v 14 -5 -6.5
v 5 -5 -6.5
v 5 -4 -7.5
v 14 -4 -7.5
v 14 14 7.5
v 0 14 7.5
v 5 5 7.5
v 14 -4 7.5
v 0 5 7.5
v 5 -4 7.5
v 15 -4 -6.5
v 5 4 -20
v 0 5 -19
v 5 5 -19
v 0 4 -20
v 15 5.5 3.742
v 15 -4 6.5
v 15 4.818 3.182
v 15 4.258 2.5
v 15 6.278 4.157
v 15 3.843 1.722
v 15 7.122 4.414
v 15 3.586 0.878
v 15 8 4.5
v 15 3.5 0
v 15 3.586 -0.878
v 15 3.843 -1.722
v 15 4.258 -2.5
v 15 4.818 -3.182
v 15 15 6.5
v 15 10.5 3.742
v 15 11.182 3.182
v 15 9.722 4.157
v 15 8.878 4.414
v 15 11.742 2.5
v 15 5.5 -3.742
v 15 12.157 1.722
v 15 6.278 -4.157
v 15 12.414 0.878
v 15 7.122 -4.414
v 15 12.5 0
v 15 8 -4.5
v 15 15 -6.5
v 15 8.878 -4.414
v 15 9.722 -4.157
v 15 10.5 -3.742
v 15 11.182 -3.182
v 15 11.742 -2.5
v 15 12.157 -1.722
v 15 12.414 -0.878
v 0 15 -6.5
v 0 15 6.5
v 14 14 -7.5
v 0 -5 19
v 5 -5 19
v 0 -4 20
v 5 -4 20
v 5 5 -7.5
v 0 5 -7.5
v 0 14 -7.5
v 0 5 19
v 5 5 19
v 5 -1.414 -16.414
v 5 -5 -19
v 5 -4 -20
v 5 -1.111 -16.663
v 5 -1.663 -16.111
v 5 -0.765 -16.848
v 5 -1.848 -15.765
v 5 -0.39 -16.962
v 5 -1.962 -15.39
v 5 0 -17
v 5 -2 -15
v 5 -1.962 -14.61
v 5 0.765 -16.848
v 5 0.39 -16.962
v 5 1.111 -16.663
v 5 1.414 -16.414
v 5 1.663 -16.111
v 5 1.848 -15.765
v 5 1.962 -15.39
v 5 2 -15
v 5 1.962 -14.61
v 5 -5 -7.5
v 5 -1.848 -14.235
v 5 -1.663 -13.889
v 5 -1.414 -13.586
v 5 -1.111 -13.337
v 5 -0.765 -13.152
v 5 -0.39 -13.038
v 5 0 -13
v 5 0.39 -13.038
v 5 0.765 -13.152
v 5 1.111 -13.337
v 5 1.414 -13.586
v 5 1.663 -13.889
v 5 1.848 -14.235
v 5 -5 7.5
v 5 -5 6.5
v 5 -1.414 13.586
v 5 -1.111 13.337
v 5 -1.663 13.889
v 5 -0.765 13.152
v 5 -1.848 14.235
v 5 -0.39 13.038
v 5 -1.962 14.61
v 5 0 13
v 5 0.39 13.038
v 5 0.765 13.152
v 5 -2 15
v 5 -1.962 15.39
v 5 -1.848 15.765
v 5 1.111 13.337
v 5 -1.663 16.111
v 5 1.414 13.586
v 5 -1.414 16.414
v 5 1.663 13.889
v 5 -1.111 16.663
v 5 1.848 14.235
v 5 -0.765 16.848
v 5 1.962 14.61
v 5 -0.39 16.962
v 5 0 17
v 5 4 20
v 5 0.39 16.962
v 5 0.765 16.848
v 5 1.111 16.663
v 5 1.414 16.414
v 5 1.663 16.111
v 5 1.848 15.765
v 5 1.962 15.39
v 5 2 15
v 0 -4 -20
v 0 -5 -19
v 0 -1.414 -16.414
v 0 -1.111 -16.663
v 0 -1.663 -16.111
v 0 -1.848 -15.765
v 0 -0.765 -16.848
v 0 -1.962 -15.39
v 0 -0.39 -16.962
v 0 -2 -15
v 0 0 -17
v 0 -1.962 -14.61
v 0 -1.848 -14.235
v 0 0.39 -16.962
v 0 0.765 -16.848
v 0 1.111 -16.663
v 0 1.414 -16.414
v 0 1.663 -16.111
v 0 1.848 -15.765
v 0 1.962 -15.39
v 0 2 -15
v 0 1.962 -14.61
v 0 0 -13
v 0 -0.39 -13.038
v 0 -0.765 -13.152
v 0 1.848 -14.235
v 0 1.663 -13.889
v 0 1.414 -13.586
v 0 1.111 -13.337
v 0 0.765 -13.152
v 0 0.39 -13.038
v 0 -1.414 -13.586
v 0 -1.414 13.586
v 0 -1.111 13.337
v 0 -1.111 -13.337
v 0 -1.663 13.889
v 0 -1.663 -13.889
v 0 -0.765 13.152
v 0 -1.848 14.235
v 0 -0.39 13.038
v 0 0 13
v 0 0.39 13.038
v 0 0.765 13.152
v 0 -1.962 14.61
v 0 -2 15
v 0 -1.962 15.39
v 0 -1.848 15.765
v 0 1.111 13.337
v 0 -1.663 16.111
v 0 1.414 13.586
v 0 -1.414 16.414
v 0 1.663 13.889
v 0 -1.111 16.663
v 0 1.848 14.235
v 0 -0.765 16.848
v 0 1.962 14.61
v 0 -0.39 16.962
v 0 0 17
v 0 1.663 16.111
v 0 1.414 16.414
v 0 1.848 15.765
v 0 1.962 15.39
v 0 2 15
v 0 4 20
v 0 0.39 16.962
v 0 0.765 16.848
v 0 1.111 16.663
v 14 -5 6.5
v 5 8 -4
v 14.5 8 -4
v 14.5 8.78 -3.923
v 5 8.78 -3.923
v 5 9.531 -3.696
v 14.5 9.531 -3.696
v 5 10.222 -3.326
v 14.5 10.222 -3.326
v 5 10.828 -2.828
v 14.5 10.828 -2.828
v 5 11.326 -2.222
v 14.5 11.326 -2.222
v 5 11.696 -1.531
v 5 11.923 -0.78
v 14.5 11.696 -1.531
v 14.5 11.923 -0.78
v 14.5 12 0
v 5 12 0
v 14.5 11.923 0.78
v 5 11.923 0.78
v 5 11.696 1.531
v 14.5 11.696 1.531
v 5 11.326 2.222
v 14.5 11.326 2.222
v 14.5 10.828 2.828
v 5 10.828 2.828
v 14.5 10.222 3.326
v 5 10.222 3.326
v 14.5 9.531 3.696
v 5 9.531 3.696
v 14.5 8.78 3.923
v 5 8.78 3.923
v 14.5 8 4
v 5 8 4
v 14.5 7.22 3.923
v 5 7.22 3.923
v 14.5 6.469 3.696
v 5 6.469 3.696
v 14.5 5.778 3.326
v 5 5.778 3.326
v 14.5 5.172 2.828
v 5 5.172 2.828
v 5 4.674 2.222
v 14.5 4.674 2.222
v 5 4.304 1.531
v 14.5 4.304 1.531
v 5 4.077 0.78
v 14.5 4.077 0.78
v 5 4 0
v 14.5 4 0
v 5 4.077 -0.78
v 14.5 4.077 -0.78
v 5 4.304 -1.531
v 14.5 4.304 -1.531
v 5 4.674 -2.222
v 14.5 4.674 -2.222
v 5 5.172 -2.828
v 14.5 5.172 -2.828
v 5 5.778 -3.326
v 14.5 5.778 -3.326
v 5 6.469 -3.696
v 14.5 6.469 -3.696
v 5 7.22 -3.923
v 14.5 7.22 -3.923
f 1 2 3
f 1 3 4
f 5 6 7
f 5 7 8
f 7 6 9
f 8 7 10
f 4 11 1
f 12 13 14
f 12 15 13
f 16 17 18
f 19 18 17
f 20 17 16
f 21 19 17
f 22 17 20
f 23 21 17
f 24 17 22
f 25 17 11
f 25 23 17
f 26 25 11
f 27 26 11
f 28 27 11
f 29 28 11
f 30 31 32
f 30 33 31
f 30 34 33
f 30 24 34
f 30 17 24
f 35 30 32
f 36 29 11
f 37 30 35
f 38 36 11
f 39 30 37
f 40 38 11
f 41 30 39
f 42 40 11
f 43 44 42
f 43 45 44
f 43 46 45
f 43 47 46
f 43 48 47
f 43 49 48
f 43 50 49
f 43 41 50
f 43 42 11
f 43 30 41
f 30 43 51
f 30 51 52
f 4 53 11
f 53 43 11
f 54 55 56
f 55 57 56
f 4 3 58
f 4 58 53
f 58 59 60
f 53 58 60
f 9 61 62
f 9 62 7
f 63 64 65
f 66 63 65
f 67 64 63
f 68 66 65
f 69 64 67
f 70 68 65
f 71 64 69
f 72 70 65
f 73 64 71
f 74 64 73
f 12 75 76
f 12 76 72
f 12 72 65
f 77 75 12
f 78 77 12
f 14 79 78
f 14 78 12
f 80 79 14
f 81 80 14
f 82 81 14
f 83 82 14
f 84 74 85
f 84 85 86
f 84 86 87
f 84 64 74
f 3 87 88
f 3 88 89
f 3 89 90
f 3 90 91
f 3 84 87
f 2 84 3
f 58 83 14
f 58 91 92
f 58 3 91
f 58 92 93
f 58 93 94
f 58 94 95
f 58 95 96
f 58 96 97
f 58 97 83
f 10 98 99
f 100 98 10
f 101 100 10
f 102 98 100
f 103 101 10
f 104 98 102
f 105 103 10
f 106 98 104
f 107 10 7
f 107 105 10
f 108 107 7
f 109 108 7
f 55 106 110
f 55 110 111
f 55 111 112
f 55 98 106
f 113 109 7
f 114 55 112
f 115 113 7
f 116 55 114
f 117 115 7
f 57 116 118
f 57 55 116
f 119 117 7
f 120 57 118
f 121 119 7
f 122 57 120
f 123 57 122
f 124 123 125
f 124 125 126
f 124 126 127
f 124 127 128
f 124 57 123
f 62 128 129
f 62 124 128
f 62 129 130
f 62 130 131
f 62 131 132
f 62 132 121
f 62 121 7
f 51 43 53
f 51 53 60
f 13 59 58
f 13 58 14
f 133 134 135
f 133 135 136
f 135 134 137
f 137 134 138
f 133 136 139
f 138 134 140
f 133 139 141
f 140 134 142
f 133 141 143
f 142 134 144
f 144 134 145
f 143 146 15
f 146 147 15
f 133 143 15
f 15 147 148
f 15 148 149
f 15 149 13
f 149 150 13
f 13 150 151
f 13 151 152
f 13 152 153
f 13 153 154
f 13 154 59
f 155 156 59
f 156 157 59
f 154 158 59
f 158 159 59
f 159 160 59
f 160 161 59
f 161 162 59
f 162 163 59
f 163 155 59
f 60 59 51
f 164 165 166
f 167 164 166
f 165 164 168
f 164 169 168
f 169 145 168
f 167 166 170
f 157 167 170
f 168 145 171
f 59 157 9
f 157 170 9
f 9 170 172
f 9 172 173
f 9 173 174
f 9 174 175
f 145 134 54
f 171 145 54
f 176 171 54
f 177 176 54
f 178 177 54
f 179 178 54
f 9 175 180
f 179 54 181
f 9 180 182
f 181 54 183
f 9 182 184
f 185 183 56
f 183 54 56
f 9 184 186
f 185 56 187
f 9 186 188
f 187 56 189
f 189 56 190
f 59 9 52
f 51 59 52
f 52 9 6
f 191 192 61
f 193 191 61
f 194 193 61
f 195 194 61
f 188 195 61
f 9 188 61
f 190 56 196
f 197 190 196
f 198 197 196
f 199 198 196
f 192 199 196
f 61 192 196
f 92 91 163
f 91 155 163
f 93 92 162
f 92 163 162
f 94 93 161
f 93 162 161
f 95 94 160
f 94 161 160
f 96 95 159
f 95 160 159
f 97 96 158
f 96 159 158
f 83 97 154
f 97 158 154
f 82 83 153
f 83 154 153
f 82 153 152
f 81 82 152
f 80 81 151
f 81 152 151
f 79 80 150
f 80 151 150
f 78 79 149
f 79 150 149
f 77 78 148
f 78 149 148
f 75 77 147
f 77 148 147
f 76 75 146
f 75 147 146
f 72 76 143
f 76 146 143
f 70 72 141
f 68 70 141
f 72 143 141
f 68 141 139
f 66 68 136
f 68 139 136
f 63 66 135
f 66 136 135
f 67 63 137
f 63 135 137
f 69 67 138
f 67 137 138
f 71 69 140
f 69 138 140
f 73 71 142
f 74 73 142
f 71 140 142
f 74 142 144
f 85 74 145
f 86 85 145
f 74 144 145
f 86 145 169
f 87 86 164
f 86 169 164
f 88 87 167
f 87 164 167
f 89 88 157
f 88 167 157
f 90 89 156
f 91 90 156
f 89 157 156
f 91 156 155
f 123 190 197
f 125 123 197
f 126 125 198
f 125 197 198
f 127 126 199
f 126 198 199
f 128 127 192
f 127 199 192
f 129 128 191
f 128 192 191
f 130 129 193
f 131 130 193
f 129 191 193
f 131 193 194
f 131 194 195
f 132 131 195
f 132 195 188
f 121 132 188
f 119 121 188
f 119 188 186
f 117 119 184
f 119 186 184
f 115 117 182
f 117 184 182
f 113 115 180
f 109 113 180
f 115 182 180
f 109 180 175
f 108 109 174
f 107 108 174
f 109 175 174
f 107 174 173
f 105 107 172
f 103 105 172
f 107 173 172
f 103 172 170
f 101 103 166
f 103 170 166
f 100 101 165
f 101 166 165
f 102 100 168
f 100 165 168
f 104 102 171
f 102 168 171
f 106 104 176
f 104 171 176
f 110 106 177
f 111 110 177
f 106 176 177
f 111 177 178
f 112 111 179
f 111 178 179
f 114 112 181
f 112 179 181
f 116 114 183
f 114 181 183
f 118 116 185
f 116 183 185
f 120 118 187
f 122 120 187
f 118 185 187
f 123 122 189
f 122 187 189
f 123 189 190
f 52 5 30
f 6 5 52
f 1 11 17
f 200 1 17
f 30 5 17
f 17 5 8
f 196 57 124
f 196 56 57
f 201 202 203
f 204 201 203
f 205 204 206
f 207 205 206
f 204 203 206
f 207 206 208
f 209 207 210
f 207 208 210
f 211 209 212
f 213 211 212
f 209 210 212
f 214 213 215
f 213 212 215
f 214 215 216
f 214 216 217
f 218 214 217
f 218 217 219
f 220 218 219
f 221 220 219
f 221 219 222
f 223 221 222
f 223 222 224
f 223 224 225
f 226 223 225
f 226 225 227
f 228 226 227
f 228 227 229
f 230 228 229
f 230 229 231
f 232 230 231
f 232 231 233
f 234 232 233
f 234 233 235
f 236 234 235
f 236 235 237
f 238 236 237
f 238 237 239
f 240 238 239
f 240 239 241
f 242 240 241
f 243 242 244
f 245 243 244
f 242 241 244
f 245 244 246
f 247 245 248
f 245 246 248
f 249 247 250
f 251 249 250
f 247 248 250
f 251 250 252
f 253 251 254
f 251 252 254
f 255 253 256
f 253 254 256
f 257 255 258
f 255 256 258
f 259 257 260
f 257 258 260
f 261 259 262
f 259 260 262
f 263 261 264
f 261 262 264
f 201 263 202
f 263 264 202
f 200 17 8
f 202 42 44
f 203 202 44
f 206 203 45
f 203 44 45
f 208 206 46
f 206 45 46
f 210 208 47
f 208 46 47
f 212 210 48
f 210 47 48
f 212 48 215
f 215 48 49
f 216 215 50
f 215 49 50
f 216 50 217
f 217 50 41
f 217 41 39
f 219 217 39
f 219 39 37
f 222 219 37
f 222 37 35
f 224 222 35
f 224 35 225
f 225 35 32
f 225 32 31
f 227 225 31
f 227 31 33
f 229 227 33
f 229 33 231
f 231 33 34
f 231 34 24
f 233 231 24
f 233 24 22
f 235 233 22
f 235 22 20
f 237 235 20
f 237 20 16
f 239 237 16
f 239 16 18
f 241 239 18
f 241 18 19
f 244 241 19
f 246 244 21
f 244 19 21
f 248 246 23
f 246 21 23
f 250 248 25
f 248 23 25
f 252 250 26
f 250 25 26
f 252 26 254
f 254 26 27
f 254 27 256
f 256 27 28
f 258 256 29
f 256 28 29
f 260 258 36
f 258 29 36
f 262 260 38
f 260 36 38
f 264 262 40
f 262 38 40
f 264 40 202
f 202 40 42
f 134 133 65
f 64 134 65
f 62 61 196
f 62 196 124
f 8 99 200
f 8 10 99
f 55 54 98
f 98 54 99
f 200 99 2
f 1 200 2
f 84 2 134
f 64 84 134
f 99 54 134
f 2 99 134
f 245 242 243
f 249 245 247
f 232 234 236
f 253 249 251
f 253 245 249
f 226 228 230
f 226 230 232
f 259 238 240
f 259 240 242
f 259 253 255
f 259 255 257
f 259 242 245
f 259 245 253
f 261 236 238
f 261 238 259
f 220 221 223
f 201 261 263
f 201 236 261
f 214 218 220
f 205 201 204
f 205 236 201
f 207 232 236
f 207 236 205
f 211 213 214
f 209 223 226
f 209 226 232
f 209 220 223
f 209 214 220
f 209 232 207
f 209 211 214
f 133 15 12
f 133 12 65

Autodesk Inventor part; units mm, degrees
ref_plane "YZ Plane" through (0, 0, 0) normal (1, 0, 0) x (0, 1, 0)
ref_plane "XZ Plane" through (0, 0, 0) normal (0, 1, 0) x (-1, 0, 0)
ref_plane "XY Plane" through (0, 0, 0) normal (0, 0, 1) x (1, 0, 0)
sketch "Sketch1" plane through (0, 0, 0) normal (1, 0, 0) x (0, 1, 0)
  line L0 (-5, 20) -> (5, 20)
  line L1 (5, 20) -> (5, -20)
  line L2 (5, -20) -> (-5, -20)
  line L3 (-5, -20) -> (-5, 20)
  line L4 (-5, 20) -> (5, -20) construction
  line L5 (5, 20) -> (-5, -20) construction
  line L6 (-7.5, 7.5) -> (7.5, -7.5) construction
  line L7 (7.5, 7.5) -> (-7.5, -7.5) construction
  line L8 (15, -7.5) -> (15, 7.5)
  line L9 (15, 7.5) -> (-5, 7.5)
  line L10 (-15, -7.5) -> (15, 7.5) construction
  line L11 (15, -7.5) -> (-15, 7.5) construction
  line L12 (-5, -7.5) -> (15, -7.5)
  point P0 (0, 0)
  point P1 (5, -7.5)
  point P2 (5, 7.5)
  point P3 (5, -7.5)
  dimension "d0" = 10
  dimension "d1" = 40
  dimension "d3" = 15
  dimension "d32" = 10
  dimension "d33" = 40
extrude "Extrusion1" add sketch "Sketch1" along normal blind 5
sketch "Sketch4" plane through (0, 0, 0) normal (-1, 0, 0) x (0, 0, 1)
  line L0 (-20, -5) -> (-20, 5) projected
  line L1 (-20, 0) -> (-17, 0)
  line L2 (-17, 0) -> (-15, 0)
  circle A0 centre (-15, 0) radius 2
  line L3 (20, 5) -> (20, -5) projected
  circle A1 centre (15, 0) radius 2
  point P0 (0, 0)
  point P1 (-20, -4)
  point P2 (-20, 4)
  point P3 (20, 4)
  point P4 (20, -4)
  dimension "d25" = 3
  dimension "d26" = 2
  dimension "d28" = 4
extrude "Extrusion4" cut sketch "Sketch4" against normal blind 10
sketch "Sketch5" plane through (5, 0, 0) normal (1, 0, 0) x (0, 0, -1)
  line L0 (7.5, 15) -> (-7.5, 15) projected
  line L1 (-7.5, 15) -> (-7.5, -5)
  line L2 (-20, -5) -> (20, -5) projected
  line L3 (-7.5, 15) -> (7.5, 15)
  line L4 (7.5, 5) -> (7.5, 15) projected
  line L5 (7.5, 5) -> (7.5, 15)
  line L6 (7.5, 15) -> (7.5, 5)
  line L7 (7.5, -5) -> (-7.5, -5)
  line L8 (7.5, 5) -> (7.5, -5)
  line L9 (-7.5, -5) -> (7.5, -5)
  point P0 (0, 0)
extrude "Extrusion5" add sketch "Sketch5" along normal blind 10
sketch "Sketch6" plane through (15, 0, 0) normal (1, 0, 0) x (0, 0, -1)
  line L0 (7.5, 15) -> (-7.5, 15) projected
  circle A0 centre (0, 8) radius 4
  point P0 (0, 0)
  point P1 (0, 15)
  dimension "d37" = 8
  dimension "d40" = 7
extrude "Extrusion6" cut sketch "Sketch6" against normal blind 10
thread "Thread2" size "M8x1" class "6H" standard "ANSI Metric M Profile" length 20
chamfer "Chamfer5" distance 1 angle 45 11 edges at (7.5, 15, 7.5) (7.5, 15, -7.5) (15, 5, -7.5) (15, 5, 7.5) (15, -5, 0) (10, -5, 7.5) (2.5, 5, 20) (2.5, -5, 20) (2.5, 5, -20) (2.5, -5, -20) (10, -5, -7.5)
chamfer "Chamfer6" distance 0.5 angle 45 1 edges at (15, 8, 4)
properties part number "chain piston adaptor"
